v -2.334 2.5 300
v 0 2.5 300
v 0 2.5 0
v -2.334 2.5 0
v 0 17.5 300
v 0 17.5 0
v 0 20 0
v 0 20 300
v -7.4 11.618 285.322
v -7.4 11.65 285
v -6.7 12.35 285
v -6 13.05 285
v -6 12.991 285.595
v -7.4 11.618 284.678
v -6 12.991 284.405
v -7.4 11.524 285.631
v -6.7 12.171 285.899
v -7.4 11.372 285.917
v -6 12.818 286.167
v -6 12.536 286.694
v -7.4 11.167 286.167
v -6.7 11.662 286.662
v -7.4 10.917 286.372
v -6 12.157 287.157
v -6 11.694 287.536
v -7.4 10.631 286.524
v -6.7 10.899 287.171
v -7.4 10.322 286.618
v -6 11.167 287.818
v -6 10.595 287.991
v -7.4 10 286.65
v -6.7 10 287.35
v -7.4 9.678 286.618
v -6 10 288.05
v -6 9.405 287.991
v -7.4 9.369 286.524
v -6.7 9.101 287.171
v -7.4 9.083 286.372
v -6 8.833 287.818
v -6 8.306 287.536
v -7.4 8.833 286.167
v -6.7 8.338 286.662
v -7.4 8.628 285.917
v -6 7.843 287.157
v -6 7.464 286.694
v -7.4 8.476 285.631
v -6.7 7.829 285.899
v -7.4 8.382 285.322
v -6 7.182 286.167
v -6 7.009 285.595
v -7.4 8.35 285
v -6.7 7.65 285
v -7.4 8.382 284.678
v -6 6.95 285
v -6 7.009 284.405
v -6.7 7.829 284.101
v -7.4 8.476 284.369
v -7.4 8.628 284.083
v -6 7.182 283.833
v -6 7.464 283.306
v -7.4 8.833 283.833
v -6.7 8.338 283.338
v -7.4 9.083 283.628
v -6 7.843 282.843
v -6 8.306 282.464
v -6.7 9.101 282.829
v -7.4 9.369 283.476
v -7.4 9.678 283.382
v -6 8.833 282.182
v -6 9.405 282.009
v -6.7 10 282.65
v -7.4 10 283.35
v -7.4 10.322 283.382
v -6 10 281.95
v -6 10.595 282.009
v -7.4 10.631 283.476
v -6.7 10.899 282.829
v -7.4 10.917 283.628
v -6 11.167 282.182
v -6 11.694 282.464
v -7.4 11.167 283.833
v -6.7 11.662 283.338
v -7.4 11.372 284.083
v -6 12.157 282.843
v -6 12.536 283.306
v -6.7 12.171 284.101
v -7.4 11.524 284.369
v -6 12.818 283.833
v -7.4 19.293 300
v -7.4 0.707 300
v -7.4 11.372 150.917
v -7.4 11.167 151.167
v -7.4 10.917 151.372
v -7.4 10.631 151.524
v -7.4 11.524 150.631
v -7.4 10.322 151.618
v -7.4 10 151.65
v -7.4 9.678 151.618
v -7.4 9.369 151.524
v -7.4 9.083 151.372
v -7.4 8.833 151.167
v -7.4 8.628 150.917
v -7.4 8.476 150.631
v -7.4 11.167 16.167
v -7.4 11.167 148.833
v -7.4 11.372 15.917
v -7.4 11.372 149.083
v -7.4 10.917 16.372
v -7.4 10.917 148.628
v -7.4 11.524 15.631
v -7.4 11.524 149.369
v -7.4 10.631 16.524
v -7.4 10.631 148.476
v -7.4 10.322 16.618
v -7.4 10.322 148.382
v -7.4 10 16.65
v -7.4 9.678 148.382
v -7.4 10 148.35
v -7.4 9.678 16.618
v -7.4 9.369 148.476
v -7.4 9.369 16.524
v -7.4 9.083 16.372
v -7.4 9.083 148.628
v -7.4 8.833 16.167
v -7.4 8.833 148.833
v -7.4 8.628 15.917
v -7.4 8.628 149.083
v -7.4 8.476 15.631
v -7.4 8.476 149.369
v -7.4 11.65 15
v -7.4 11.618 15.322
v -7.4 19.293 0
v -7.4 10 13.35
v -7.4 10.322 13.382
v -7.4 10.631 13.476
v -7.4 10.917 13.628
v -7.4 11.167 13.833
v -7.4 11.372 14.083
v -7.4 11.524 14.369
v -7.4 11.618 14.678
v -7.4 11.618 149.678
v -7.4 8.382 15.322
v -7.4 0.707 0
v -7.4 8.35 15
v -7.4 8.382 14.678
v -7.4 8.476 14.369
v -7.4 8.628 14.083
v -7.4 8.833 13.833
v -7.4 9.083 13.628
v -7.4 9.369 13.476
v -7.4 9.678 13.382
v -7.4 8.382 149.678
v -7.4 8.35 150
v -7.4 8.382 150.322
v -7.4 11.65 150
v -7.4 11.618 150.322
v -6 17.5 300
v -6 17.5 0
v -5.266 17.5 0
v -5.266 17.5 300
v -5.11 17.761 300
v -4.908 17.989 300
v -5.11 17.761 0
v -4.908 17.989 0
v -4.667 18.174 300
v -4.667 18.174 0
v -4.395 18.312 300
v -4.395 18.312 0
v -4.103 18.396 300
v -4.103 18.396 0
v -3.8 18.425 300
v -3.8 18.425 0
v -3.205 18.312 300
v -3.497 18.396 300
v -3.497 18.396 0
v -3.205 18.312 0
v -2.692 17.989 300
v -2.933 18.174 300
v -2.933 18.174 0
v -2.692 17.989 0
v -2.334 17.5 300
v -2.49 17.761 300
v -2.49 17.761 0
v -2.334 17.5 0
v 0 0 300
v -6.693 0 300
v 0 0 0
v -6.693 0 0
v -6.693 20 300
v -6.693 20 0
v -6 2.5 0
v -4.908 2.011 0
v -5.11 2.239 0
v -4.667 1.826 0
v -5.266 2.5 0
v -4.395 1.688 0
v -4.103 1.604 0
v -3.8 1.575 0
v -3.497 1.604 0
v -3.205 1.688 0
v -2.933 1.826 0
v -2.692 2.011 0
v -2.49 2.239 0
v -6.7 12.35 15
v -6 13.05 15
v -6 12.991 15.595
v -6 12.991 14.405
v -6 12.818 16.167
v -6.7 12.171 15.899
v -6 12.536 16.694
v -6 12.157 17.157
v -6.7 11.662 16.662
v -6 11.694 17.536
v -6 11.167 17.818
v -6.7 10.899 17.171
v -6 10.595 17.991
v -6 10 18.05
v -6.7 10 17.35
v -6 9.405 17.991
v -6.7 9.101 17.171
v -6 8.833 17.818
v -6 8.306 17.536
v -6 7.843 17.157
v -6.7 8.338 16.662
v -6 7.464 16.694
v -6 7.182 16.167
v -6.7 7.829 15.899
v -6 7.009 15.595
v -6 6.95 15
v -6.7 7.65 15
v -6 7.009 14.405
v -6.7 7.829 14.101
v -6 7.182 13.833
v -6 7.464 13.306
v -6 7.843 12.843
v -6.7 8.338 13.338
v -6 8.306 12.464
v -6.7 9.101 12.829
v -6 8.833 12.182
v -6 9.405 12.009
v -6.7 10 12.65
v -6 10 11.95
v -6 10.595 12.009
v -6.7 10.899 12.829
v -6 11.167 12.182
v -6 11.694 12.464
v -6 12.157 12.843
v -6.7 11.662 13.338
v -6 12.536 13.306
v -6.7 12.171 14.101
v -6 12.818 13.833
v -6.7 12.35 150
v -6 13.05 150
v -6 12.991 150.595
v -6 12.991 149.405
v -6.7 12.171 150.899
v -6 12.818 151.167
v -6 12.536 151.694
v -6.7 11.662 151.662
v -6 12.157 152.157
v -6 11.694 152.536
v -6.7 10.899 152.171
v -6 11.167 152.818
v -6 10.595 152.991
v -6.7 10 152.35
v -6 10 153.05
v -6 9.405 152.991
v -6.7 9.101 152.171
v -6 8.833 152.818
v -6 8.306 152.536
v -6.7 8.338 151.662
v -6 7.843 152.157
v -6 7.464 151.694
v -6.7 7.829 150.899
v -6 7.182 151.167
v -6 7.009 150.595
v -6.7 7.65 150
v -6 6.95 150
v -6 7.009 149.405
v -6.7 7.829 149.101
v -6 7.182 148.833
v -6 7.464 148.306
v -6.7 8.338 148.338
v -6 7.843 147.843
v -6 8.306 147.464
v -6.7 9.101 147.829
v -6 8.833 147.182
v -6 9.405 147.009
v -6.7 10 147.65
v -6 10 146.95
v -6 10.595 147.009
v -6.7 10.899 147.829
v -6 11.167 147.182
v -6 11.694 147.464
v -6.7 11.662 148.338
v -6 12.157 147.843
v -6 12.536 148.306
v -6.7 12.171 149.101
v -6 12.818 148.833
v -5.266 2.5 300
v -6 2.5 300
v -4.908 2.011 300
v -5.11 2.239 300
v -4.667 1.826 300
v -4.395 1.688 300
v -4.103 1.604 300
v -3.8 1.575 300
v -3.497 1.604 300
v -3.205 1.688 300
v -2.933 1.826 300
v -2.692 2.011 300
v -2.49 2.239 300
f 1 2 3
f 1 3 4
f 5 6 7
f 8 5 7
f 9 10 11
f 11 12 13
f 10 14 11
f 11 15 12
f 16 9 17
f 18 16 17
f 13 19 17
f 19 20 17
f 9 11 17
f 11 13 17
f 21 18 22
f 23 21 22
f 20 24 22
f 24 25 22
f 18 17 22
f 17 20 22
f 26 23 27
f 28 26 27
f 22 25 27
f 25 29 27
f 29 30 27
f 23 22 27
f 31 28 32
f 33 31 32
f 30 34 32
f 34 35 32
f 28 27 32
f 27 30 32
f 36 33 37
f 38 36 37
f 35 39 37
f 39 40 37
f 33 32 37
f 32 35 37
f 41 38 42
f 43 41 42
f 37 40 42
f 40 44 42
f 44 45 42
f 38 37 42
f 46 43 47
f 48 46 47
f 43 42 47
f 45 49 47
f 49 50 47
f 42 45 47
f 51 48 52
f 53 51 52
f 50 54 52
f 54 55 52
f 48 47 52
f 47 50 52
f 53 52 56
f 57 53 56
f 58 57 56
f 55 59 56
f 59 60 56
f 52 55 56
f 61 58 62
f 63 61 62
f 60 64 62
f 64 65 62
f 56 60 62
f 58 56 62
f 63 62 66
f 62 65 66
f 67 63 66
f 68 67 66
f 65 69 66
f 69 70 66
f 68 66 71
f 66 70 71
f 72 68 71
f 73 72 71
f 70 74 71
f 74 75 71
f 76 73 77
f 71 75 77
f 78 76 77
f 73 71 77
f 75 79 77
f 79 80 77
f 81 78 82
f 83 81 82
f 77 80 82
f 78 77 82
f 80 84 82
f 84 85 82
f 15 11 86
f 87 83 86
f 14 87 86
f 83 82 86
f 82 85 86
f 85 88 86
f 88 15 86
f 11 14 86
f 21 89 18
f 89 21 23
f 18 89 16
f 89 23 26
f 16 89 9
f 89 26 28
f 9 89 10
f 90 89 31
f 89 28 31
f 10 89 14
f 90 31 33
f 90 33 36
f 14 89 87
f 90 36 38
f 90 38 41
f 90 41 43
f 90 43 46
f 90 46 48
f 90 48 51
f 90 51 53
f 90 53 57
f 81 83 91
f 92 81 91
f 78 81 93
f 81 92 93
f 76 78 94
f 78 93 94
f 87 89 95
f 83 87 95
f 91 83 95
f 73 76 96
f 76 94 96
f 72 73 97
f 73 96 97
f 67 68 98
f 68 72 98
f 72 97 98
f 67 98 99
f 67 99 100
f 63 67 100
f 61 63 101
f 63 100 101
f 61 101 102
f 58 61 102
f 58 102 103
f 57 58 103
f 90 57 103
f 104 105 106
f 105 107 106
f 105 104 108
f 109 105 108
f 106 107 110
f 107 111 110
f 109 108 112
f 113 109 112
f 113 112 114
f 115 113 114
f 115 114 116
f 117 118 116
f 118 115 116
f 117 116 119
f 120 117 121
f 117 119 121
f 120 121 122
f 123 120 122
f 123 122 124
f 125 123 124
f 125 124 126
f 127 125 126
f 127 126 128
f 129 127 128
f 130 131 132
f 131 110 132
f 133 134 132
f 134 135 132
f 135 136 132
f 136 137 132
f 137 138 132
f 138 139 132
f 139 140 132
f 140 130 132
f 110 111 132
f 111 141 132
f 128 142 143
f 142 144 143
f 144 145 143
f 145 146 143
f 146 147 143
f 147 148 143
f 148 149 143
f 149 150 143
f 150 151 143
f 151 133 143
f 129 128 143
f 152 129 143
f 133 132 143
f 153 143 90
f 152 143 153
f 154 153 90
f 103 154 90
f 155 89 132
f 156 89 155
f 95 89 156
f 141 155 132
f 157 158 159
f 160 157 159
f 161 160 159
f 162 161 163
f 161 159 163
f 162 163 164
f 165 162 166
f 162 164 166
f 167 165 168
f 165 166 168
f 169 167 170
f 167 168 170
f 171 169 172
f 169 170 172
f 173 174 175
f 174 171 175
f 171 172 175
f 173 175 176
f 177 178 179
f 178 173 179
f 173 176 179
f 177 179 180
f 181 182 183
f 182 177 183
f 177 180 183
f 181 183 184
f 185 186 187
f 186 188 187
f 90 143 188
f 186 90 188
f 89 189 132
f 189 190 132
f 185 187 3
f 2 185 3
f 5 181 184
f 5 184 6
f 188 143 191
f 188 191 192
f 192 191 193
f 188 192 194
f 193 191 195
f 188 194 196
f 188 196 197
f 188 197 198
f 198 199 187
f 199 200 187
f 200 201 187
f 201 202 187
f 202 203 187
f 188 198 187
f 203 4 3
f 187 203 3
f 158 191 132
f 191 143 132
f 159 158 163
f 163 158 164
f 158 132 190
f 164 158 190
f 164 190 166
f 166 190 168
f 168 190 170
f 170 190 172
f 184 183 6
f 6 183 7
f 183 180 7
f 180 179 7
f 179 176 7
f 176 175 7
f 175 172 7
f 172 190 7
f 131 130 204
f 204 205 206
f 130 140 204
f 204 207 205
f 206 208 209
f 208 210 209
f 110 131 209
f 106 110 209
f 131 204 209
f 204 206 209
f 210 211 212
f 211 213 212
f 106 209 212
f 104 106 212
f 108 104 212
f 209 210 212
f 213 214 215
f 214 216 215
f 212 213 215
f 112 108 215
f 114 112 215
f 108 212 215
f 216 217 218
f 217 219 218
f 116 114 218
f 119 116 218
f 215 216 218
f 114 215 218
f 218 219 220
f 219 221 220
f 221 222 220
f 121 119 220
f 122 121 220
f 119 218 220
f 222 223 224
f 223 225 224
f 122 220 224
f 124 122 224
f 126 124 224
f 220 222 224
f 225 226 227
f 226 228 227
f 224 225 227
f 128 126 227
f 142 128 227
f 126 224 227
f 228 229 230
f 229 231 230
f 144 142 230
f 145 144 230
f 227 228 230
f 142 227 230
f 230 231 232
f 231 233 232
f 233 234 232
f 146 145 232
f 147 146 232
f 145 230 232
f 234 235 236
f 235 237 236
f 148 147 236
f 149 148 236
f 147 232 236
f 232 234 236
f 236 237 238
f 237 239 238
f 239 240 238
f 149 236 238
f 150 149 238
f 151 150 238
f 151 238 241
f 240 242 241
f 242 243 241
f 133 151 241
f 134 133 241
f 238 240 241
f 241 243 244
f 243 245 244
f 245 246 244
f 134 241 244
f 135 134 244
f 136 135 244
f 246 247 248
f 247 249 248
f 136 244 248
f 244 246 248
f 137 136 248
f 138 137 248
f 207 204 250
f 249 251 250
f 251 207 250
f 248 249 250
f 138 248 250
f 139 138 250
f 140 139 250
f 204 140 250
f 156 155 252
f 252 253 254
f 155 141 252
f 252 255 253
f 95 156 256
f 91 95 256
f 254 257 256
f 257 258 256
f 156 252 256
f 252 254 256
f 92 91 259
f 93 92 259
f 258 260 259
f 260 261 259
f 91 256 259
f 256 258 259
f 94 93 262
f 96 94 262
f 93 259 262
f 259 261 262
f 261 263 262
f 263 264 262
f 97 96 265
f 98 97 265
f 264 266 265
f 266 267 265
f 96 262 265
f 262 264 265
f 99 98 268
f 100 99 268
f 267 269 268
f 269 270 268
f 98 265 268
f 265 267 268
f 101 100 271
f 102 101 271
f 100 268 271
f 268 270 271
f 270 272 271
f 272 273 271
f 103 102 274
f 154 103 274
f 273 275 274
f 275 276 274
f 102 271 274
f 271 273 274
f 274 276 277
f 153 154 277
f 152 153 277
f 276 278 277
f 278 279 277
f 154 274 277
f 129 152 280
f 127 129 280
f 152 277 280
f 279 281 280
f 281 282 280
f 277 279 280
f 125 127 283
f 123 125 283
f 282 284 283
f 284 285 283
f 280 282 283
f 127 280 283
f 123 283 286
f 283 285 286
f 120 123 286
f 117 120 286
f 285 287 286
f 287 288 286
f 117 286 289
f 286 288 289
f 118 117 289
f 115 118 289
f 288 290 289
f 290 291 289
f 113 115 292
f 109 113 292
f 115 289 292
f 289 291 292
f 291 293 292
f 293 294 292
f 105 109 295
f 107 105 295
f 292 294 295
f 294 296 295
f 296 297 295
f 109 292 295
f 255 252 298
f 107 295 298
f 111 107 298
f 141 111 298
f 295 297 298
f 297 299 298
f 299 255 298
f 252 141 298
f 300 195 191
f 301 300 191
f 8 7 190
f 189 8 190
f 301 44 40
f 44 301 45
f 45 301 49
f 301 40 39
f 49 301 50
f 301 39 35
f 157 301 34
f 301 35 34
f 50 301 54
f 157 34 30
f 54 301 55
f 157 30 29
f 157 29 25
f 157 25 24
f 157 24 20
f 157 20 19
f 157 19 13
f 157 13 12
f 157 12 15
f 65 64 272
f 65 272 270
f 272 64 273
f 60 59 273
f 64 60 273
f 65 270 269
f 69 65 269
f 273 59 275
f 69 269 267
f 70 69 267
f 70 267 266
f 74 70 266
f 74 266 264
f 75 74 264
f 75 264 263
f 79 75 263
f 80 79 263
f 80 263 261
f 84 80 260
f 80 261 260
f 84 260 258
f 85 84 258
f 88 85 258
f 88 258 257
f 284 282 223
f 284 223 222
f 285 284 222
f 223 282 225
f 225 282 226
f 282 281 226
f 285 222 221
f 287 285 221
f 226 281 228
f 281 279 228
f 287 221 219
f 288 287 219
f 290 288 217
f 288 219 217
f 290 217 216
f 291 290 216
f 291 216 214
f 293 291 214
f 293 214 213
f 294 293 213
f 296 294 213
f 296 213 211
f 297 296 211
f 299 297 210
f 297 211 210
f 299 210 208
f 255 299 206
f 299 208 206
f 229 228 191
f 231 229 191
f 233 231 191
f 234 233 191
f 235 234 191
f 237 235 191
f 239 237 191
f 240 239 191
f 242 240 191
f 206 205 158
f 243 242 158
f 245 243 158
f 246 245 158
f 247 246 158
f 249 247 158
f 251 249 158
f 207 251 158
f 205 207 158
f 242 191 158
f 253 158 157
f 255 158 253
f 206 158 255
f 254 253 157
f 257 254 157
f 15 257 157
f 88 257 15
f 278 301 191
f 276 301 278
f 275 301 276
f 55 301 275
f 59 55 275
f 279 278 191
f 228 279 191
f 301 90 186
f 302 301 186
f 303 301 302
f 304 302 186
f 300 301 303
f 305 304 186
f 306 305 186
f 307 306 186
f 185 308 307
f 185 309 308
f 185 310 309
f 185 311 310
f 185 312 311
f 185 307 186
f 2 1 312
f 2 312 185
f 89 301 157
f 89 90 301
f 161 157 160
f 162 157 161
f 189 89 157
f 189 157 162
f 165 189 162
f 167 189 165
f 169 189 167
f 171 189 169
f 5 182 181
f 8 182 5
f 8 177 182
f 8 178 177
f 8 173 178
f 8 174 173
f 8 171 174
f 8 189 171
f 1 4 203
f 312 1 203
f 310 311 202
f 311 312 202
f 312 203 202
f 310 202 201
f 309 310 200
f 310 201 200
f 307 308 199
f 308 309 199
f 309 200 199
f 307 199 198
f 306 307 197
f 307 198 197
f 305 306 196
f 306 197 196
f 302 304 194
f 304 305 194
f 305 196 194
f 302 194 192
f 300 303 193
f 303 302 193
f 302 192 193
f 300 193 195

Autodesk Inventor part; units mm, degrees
sketch "Sketch_1" plane through (0, 0, 0) normal (0, 0, 1) x (1, 0, 0)
  line L0 (-7.4, 0.7071) -> (-6.6929, 0)
  line L1 (-6.6929, 0) -> (0, 0)
  line L2 (0, 0) -> (0, 2.5)
  line L3 (0, 2.5) -> (-2.3335, 2.5)
  arc A0 (-5.2665, 2.5) -> (-2.3335, 2.5) centre (-3.8, 3.2) ccw
  line L4 (-5.2665, 2.5) -> (-6, 2.5)
  line L5 (-6, 2.5) -> (-6, 17.5)
  line L6 (-6, 17.5) -> (-5.2665, 17.5)
  arc A1 (-2.3335, 17.5) -> (-5.2665, 17.5) centre (-3.8, 16.8) ccw
  line L7 (-2.3335, 17.5) -> (0, 17.5)
  line L8 (0, 17.5) -> (0, 20)
  line L9 (0, 20) -> (-6.6929, 20)
  line L10 (-6.6929, 20) -> (-7.4, 19.2929)
  line L11 (-7.4, 19.2929) -> (-7.4, 0.7071)
extrude "Extrusion1" add sketch "Sketch_1" along normal blind 300
sketch "Sketch_2" plane through (0, 0, 15) normal (0, 0, 1) x (1, 0, 0)
  line L0 (-6, 10) -> (-7.4, 10)
  line L1 (-7.4, 10) -> (-7.4, 11.65)
  line L2 (-7.4, 11.65) -> (-6, 13.05)
  line L3 (-6, 13.05) -> (-6, 10)
  line L4 (-6, 10) -> (-7.4, 10)
revolve "Revolution1" cut sketch "Sketch_2" angle 360 about axis through (-6, 10, 15) along (1, 0, 0)
pattern_linear "Rectangular Pattern1" count 3 spacing 135 along (0, 0, 1) of "Revolution1"
ref_plane "to_ball_XY" through (-3.8, 3.25, 111) normal (0, 0, 1) x (1, 0, 0)
ref_plane "to_ball_YZ" through (-3.8, 3.25, 111) normal (1, 0, 0) x (0, 1, 0)
ref_plane "to_ball_ZX" through (-3.8, 3.25, 111) normal (0, 1, 0) x (0, 0, 1)
ref_plane "to_ball1_XY" through (-3.8, 16.75, 111) normal (0, 0, 1) x (1, 0, 0)
ref_plane "to_ball1_YZ" through (-3.8, 16.75, 111) normal (1, 0, 0) x (0, 1, 0)
ref_plane "to_ball1_ZX" through (-3.8, 16.75, 111) normal (0, 1, 0) x (0, 0, 1)
ref_plane "to_rail_XY" through (0.6, 10, 150) normal (0, 0, 1) x (1, 0, 0)
ref_plane "to_rail_YZ" through (0.6, 10, 150) normal (1, 0, 0) x (0, 1, 0)
ref_plane "to_rail_ZX" through (0.6, 10, 150) normal (0, 1, 0) x (0, 0, 1)
properties part number "SAR330-30_b" material "Aluminum 6061"
